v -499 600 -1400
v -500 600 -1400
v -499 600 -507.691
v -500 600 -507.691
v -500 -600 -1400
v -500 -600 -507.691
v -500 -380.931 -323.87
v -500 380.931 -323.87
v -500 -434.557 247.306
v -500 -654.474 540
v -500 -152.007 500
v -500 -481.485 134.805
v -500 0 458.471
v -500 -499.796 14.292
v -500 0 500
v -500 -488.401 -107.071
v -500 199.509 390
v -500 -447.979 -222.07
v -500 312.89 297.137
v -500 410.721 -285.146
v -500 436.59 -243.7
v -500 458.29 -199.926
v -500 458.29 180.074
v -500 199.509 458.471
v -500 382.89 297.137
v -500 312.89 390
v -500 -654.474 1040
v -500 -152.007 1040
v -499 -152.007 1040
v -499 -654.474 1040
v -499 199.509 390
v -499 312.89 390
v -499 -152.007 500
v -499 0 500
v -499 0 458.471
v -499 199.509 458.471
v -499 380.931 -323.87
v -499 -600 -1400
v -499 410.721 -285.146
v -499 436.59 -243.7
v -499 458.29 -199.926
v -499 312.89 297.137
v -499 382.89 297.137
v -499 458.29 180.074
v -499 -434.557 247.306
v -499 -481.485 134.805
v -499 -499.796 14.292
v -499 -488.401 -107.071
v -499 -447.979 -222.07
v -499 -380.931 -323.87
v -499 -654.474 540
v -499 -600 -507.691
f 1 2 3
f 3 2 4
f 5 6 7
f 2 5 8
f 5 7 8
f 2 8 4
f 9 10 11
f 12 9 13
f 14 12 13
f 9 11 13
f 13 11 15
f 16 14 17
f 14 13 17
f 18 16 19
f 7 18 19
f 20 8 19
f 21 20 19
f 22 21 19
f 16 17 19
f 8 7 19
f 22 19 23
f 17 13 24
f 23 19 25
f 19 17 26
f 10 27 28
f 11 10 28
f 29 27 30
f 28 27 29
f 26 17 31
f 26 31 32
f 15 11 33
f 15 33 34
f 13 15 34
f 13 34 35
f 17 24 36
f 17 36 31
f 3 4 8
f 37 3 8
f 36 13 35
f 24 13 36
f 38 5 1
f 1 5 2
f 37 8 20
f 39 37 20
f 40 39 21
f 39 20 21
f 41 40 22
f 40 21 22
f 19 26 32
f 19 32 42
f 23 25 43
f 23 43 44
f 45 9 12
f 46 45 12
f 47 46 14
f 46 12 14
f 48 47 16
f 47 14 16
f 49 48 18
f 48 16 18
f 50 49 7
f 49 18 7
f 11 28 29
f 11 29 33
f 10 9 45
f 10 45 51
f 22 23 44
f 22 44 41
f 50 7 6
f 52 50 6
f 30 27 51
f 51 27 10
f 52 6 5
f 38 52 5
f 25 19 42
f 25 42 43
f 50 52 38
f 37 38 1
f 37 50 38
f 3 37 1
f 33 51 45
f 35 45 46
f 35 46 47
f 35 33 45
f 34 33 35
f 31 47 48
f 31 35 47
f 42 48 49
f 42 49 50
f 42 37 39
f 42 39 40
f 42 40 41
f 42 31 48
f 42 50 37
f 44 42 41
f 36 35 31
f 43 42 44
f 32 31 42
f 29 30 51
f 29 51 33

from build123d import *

# Parameters (mm, degrees)
PAD_DEPTH = 1


with BuildPart() as part:
    # Sketch → Pad (new body)
    with BuildSketch(Plane.YZ.offset(-500)):
        with BuildLine():
            ThreePointArc((-434.556983, 247.305941), (-497.810755, -46.738128), (-380.9308, -323.869921))
            Line((-380.9308, -323.869921), (-600, -507.690796))
            Line((-600, -507.690796), (-600, -1400))
            Line((-600, -1400), (600, -1400))
            Line((600, -1400), (600, -507.690796))
            Line((600, -507.690796), (380.9308, -323.869921))
            ThreePointArc((380.9308, -323.869921), (424.161816, -264.739029), (458.28967, -199.926432))
            Line((458.28967, 180.073568), (458.28967, -199.926432))
            Line((382.889757, 297.136749), (458.28967, 180.073568))
            Line((312.889757, 297.136749), (382.889757, 297.136749))
            Line((312.889757, 390), (312.889757, 297.136749))
            Line((199.509467, 390), (312.889757, 390))
            Line((199.509467, 458.471343), (199.509467, 390))
            Line((3.8e-05, 458.471343), (199.509467, 458.471343))
            Line((3.8e-05, 500), (3.8e-05, 458.471343))
            Line((-152.007187, 500), (3.8e-05, 500))
            Line((-152.007187, 1040), (-152.007187, 500))
            Line((-654.474365, 1040), (-152.007187, 1040))
            Line((-654.474365, 1040), (-654.474365, 540))
            Line((-434.556983, 247.305941), (-654.474365, 540))
        make_face()
    extrude(amount=PAD_DEPTH)


solid = part.part
